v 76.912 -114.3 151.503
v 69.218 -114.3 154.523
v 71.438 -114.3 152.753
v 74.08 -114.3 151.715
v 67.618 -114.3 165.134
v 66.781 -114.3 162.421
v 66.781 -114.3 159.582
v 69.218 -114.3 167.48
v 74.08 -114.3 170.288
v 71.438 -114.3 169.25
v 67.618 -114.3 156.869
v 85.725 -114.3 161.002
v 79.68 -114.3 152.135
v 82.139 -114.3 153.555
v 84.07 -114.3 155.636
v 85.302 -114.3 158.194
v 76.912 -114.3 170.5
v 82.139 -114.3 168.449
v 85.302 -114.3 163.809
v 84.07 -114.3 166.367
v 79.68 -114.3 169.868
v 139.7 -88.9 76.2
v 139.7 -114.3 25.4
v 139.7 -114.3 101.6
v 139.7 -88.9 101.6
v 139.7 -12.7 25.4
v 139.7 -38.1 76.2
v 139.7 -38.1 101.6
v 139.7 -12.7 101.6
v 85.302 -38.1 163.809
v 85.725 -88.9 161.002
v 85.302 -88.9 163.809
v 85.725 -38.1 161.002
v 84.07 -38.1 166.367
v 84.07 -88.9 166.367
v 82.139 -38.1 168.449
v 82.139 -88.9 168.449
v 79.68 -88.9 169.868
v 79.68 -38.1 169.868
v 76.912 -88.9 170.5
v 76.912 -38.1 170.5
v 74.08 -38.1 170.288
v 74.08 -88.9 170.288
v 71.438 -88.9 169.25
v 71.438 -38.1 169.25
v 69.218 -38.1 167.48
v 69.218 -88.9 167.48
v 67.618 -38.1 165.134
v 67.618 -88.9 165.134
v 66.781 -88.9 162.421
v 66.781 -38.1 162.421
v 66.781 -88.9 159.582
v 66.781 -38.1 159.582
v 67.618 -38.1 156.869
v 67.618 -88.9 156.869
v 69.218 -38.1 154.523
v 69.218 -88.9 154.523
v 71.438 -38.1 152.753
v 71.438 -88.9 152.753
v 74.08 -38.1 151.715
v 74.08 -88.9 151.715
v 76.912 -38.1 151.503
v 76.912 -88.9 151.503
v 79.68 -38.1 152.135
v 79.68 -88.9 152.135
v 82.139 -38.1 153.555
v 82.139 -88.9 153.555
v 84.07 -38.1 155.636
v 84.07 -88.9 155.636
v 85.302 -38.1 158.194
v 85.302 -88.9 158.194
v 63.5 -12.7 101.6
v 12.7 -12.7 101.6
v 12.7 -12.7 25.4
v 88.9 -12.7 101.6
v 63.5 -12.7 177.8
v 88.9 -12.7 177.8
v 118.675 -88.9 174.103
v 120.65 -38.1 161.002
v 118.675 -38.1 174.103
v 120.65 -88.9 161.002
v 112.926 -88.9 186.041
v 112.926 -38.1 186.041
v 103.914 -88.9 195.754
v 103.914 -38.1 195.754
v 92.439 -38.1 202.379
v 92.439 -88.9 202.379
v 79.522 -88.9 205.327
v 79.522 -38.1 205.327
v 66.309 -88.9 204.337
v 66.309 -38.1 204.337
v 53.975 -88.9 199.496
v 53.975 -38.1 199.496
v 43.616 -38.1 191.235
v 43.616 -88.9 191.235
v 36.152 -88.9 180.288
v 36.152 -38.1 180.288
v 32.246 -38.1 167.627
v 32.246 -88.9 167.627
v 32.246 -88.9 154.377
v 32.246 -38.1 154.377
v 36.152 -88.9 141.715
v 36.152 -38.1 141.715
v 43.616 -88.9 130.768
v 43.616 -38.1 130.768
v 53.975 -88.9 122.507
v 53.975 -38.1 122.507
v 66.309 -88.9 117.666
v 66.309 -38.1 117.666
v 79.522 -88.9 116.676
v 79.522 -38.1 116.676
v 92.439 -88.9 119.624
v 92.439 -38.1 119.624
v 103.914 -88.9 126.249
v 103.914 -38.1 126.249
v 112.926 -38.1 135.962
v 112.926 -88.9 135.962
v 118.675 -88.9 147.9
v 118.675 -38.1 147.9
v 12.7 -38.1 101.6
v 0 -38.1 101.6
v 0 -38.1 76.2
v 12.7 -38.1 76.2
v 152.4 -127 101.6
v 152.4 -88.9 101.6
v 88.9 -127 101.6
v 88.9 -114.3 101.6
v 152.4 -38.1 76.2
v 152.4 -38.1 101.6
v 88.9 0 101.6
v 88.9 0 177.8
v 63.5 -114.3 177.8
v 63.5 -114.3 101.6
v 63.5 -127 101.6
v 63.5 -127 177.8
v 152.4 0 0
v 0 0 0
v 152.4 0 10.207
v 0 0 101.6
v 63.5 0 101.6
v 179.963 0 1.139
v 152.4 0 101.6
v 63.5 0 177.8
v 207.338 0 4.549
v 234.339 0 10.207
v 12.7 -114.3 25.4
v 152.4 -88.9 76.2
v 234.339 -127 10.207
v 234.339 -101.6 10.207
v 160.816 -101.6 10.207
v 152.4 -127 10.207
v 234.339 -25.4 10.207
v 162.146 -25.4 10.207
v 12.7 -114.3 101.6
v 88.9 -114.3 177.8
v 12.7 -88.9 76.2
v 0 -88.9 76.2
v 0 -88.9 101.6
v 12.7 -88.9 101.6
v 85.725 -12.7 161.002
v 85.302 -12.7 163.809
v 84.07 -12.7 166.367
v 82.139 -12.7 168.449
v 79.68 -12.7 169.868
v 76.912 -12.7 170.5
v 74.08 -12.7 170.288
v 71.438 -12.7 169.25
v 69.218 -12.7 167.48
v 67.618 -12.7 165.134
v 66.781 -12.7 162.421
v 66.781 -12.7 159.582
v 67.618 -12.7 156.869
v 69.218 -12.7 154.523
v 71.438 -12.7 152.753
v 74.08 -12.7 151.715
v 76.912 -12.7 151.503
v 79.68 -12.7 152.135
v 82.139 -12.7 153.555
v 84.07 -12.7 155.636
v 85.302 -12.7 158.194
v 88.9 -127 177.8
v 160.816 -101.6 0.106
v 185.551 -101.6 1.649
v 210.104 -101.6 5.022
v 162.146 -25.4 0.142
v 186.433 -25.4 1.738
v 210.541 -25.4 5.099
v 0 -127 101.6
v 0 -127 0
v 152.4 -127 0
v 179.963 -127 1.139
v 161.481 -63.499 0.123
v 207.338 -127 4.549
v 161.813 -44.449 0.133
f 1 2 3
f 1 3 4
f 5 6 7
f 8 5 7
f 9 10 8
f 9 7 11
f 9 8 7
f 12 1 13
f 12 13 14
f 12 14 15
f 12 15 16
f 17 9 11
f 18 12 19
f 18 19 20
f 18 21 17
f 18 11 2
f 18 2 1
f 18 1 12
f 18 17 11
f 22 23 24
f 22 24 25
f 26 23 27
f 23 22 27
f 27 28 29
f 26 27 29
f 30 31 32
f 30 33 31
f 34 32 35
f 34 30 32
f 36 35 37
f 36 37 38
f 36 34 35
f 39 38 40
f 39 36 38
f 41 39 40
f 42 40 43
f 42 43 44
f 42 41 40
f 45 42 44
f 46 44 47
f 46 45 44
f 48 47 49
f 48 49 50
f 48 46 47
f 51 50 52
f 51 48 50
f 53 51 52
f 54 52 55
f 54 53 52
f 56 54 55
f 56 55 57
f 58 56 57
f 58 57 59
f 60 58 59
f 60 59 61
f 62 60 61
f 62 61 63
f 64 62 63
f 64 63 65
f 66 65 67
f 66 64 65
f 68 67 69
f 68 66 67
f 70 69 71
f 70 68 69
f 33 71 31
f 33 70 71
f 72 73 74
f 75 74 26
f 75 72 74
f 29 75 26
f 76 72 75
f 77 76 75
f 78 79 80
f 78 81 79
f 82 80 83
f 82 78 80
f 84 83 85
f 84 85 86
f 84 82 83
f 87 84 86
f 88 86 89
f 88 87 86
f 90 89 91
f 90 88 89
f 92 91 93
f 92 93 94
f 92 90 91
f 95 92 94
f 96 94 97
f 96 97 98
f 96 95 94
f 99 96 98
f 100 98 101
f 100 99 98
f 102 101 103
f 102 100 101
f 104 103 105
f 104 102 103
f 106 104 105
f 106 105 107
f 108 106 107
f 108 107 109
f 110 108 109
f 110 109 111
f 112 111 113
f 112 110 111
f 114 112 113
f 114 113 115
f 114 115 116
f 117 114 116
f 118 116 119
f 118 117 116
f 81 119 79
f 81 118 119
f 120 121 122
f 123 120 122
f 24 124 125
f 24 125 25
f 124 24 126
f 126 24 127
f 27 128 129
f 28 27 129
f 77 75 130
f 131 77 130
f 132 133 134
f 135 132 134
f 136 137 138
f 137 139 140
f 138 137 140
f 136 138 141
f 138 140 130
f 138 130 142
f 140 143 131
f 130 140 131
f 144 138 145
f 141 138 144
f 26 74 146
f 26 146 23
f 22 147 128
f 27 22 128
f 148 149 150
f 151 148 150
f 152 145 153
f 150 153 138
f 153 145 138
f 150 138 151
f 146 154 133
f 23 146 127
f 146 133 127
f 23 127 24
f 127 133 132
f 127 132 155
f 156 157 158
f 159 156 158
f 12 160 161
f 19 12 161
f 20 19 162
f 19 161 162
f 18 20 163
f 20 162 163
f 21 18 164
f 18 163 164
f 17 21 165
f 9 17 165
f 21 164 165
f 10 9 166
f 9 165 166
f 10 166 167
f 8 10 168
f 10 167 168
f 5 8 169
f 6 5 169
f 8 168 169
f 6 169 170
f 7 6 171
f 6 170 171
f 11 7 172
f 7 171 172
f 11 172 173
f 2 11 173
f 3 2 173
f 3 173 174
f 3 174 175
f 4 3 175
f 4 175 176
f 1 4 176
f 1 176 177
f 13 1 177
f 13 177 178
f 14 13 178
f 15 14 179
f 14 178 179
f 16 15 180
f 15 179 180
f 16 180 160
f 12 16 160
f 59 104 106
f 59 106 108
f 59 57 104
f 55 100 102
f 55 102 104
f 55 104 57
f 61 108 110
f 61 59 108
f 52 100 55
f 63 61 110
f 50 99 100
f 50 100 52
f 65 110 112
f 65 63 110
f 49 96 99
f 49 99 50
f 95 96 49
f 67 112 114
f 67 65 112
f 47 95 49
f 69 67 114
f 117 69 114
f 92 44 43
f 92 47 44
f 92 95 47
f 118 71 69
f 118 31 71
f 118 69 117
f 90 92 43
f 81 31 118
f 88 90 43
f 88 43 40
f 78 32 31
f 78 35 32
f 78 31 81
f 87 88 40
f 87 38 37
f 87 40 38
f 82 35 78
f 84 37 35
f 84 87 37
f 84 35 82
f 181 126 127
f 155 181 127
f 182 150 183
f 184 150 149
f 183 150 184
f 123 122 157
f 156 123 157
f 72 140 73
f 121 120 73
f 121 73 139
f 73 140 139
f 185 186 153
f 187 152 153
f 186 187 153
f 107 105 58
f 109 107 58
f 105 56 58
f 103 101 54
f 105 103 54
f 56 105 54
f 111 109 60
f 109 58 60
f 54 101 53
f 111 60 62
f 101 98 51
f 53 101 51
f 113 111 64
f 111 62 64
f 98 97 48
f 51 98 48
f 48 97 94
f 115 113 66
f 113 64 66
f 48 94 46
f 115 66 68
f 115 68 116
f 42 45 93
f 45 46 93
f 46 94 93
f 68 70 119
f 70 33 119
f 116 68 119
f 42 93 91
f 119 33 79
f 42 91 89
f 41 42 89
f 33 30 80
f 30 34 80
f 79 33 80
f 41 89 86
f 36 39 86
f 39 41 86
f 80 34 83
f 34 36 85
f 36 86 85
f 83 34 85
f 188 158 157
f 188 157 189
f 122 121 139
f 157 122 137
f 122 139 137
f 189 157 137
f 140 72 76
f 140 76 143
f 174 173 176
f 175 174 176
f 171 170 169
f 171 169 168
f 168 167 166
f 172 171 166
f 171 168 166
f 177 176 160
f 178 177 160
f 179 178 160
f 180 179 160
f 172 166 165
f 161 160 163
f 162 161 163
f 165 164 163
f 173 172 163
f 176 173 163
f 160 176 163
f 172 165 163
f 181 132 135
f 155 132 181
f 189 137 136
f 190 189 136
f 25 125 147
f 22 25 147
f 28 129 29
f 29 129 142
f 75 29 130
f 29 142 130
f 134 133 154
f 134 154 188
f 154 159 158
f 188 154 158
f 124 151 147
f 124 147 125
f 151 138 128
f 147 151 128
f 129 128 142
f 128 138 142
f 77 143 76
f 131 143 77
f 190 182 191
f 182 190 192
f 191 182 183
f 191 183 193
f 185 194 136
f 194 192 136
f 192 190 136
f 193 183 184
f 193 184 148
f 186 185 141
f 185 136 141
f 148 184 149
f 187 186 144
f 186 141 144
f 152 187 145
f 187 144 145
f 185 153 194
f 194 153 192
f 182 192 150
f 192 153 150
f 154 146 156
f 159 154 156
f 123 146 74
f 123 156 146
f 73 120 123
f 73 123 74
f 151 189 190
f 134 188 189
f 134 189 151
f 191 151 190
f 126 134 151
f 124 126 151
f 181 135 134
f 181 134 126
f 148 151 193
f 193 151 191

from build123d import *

# Parameters (mm, degrees)
F1_DEPTH  = 127
F2_W      = 127
F2_H      = 101.6
F3_DEPTH  = 76.2
F5_DEPTH  = 25.4
F7_DEPTH  = 25.4
F8_W      = 25.4
F8_H      = 12.7
F9_DEPTH  = 76.2
F11_DEPTH = 25.4
F12_R     = 9.525
F13_DEPTH = 101.6
F15_R     = 44.45
F15_R_2   = 9.525
F16_DEPTH = 25.4


with BuildPart() as f1:
    # F0 (on Front) → F1 (new body)
    with BuildSketch(Plane.XZ):
        Polygon((0, 101.6), (0, 0), (152.4, 0), (152.4, 10.206657), (152.4, 101.6), align=None)
        with BuildLine():
            Line((152.4, 10.206657), (152.4, 0))
            ThreePointArc((152.4, 0), (193.68606, 2.561486), (234.338875, 10.206657))
            Line((234.338875, 10.206657), (152.4, 10.206657))
        make_face()
    extrude(amount=F1_DEPTH)

    # F2 (on face) → F3 (cut)
    with BuildSketch(Plane.XY.offset(101.6)):
        with Locations((76.2, -63.5)):
            Rectangle(F2_W, F2_H)
    extrude(amount=-F3_DEPTH, mode=Mode.SUBTRACT)

    # F4 (on face) → F5 (cut)
    with BuildSketch(Plane.YZ.offset(152.4)):
        Polygon((-38.1, 101.6), (-63.5, 101.6), (-88.9, 101.6), (-88.9, 76.2), (-38.1, 76.2), align=None)
    extrude(amount=-F5_DEPTH, mode=Mode.SUBTRACT)

    # F6 (on face) → F7 (cut)
    with BuildSketch(Plane(origin=(0, 0, 0), x_dir=(0, -1, 0), z_dir=(-1, 0, 0))):
        Polygon((88.9, 101.6), (63.5, 101.6), (38.1, 101.6), (38.1, 76.2), (88.9, 76.2), align=None)
    extrude(amount=-F7_DEPTH, mode=Mode.SUBTRACT)

    # F8 (on face) → F9 (join)
    with BuildSketch(Plane.XY.offset(101.6)):
        Polygon((63.5, -127), (76.2, -127), (88.9, -127), (88.9, -114.3), (63.5, -114.3), align=None)
        with Locations((76.2, -6.35)):
            Rectangle(F8_W, F8_H)
    extrude(amount=F9_DEPTH)

    # F10 (on face) → F11 (cut)
    with BuildSketch(Plane.XY.offset(10.206657)):
        Polygon((162.145615, -25.4), (160.815539, -101.6), (198.388083, -101.6), (234.338875, -101.6), (234.338875, -25.4), (198.388083, -25.4), align=None)
    extrude(amount=-F11_DEPTH, mode=Mode.SUBTRACT)


with BuildPart() as f13:
    # F12 (on face) → F13 (new body, through all)
    with BuildSketch(Plane.XZ.offset(12.7)):
        with Locations((76.2, 161.001593)):
            Circle(F12_R)
    extrude(amount=F13_DEPTH)


with BuildPart() as f16:
    # F15 (on offset) → F16 (new body, symmetric)
    with BuildSketch(Plane.XZ.offset(63.5)):
        with Locations((76.2, 161.001593)):
            Circle(F15_R)
        with Locations((76.2, 161.001593)):
            Circle(F15_R_2, mode=Mode.SUBTRACT)
    extrude(amount=F16_DEPTH, both=True)


solid = Compound([f1.part, f13.part, f16.part])
